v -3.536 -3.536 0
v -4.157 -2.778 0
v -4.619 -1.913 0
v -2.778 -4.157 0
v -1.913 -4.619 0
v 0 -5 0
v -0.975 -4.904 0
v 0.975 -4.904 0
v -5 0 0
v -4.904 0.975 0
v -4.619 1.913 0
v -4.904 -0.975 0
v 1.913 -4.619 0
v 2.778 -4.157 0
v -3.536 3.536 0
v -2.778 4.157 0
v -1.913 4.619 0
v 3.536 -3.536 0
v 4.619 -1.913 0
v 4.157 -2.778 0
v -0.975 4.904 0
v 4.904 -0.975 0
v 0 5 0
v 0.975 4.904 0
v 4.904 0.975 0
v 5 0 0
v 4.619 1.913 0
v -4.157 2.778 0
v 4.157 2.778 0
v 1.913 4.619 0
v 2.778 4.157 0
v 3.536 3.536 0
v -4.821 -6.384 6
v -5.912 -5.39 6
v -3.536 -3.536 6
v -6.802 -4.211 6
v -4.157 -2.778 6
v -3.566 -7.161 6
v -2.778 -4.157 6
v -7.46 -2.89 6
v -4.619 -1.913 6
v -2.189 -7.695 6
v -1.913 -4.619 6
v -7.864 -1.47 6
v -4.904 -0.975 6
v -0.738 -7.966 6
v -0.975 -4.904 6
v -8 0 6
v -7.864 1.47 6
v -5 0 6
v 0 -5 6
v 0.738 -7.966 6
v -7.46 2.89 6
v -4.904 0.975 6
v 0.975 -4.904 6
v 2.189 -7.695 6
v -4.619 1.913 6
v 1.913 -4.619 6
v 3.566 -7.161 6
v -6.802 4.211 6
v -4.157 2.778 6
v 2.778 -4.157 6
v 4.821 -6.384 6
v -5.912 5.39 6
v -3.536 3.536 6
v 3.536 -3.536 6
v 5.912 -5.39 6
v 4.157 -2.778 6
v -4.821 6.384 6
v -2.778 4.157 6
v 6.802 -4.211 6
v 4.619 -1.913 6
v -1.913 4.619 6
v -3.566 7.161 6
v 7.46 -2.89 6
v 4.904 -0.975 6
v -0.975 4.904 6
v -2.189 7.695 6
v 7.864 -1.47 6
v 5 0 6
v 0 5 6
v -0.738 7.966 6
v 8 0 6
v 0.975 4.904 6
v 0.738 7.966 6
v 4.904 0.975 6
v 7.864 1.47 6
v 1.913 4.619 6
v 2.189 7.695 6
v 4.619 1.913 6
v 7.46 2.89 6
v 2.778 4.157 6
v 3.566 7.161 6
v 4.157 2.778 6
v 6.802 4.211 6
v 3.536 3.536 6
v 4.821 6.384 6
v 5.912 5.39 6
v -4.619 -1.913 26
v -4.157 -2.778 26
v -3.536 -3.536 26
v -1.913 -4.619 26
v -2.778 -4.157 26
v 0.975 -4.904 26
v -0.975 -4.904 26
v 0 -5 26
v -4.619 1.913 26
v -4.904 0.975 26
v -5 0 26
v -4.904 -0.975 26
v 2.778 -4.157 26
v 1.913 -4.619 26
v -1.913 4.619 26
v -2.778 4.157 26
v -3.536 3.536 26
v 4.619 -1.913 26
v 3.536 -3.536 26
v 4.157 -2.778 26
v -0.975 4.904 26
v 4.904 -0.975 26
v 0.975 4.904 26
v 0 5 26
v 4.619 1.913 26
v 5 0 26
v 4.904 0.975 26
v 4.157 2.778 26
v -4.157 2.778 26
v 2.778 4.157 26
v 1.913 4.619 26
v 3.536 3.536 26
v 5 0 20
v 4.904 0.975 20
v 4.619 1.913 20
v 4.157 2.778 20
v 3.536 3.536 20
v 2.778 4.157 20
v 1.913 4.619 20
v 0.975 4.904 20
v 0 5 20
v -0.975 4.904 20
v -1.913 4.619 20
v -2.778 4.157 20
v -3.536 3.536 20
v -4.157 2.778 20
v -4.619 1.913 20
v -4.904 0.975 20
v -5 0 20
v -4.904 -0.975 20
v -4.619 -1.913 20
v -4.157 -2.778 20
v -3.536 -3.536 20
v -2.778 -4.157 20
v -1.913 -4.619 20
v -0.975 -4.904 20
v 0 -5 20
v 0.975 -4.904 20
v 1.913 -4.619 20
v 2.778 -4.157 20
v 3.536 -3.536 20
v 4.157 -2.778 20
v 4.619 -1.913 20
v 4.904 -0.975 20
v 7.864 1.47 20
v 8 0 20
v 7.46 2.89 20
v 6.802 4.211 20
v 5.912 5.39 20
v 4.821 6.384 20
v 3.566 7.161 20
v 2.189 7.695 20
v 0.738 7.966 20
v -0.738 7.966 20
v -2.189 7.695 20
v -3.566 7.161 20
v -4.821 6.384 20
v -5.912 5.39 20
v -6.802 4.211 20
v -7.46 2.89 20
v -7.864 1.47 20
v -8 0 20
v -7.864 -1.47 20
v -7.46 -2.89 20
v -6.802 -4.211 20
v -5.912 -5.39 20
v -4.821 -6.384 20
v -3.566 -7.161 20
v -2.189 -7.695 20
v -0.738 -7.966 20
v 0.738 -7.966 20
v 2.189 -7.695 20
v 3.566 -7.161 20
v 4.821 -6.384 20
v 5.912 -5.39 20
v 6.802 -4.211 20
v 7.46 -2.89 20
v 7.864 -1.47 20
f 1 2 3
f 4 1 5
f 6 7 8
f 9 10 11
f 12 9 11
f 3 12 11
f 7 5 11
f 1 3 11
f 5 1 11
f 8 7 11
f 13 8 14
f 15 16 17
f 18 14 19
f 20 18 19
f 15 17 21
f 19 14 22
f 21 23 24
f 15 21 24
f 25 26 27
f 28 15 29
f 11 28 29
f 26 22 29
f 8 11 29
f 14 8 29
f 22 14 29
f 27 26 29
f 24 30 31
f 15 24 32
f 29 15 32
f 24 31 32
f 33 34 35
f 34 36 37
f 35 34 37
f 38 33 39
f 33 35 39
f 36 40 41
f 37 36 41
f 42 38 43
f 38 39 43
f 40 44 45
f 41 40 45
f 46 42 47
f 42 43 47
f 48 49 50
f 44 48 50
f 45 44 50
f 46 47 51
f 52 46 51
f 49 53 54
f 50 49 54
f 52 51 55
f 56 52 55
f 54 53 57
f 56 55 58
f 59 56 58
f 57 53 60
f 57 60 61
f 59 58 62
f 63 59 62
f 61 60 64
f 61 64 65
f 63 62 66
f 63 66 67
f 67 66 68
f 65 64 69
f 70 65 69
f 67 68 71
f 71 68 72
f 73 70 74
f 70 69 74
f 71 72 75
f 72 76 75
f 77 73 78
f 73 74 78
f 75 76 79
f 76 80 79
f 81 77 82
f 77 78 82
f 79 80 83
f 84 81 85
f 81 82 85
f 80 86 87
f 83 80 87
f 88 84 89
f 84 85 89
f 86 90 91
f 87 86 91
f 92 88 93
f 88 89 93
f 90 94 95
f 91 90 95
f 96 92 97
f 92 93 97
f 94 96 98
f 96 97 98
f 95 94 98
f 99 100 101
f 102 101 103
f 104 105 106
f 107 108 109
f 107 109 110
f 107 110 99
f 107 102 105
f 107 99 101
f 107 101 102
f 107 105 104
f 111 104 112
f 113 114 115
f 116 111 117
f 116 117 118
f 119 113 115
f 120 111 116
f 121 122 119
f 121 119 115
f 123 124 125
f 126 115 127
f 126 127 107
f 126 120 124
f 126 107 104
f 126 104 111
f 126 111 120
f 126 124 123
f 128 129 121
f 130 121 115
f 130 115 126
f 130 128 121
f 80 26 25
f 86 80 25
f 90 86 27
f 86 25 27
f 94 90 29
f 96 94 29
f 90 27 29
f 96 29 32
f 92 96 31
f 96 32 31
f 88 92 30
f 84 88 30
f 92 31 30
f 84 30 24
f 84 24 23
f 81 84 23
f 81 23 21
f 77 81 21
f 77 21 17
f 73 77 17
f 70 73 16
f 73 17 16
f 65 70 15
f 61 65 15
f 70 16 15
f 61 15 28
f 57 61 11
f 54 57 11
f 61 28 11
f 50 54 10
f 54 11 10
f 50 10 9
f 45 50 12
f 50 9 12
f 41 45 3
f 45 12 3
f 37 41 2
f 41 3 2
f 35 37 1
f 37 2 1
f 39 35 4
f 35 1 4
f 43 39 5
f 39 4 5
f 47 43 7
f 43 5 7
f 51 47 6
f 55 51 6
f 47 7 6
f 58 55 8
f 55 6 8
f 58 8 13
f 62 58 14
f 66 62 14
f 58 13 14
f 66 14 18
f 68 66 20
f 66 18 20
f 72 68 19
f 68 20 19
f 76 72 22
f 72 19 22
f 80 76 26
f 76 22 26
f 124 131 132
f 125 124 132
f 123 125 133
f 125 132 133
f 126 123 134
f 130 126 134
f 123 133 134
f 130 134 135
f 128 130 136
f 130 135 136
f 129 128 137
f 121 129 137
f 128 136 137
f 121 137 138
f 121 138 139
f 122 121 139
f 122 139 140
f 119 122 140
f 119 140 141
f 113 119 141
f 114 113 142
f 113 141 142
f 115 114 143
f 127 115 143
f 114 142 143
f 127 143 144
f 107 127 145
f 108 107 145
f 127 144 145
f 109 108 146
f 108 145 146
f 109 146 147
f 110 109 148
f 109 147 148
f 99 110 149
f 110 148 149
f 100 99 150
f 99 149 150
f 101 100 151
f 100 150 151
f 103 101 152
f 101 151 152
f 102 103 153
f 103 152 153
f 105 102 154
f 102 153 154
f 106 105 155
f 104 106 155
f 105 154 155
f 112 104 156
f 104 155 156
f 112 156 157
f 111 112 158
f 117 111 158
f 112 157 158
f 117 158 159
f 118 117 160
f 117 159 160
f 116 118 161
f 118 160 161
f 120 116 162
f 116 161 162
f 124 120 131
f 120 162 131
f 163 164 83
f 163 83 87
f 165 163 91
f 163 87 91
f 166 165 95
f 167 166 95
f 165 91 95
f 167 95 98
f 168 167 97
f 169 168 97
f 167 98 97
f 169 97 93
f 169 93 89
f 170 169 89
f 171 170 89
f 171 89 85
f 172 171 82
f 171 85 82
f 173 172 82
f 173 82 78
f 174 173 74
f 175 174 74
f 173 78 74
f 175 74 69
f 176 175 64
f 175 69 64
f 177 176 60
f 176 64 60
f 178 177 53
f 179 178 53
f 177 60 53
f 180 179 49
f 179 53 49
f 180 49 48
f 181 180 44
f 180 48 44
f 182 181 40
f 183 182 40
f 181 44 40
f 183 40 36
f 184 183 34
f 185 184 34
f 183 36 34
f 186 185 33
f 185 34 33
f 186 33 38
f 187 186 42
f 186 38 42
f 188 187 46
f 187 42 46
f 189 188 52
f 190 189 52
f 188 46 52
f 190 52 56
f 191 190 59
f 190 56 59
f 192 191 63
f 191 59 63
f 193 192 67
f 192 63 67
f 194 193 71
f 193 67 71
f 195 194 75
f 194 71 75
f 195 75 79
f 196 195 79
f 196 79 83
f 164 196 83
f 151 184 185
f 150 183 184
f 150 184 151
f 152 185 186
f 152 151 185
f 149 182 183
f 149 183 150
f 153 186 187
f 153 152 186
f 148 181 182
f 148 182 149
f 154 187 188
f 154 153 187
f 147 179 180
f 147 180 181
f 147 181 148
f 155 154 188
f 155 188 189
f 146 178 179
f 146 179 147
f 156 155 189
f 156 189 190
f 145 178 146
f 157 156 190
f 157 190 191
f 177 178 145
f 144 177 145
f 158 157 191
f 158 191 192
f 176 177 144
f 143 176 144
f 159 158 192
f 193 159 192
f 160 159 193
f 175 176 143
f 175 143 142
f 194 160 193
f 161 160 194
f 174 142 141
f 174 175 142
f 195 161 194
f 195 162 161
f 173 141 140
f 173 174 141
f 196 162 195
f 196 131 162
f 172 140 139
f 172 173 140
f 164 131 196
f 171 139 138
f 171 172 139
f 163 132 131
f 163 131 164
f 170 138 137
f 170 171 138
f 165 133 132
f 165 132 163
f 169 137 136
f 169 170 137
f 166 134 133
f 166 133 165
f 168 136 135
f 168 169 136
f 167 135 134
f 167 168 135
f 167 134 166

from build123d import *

# Parameters (mm, degrees)
F0_R     = 5
F1_DEPTH = 6
F2_R     = 8
F2_R_2   = 5
F3_DEPTH = 14
F4_R     = 5
F5_DEPTH = 6


with BuildPart() as f1:
    # F0 (on Top) → F1 (new body)
    with BuildSketch(Plane.XY):
        Circle(F0_R)
    extrude(amount=F1_DEPTH)

    # F2 (on face) → F3 (join)
    with BuildSketch(Plane.XY.offset(6)):
        Circle(F2_R)
        Circle(F2_R_2, mode=Mode.SUBTRACT)
        Circle(F2_R_2)
    extrude(amount=F3_DEPTH)

    # F4 (on face) → F5 (join)
    with BuildSketch(Plane.XY.offset(20)):
        Circle(F4_R)
    extrude(amount=F5_DEPTH)


solid = f1.part
